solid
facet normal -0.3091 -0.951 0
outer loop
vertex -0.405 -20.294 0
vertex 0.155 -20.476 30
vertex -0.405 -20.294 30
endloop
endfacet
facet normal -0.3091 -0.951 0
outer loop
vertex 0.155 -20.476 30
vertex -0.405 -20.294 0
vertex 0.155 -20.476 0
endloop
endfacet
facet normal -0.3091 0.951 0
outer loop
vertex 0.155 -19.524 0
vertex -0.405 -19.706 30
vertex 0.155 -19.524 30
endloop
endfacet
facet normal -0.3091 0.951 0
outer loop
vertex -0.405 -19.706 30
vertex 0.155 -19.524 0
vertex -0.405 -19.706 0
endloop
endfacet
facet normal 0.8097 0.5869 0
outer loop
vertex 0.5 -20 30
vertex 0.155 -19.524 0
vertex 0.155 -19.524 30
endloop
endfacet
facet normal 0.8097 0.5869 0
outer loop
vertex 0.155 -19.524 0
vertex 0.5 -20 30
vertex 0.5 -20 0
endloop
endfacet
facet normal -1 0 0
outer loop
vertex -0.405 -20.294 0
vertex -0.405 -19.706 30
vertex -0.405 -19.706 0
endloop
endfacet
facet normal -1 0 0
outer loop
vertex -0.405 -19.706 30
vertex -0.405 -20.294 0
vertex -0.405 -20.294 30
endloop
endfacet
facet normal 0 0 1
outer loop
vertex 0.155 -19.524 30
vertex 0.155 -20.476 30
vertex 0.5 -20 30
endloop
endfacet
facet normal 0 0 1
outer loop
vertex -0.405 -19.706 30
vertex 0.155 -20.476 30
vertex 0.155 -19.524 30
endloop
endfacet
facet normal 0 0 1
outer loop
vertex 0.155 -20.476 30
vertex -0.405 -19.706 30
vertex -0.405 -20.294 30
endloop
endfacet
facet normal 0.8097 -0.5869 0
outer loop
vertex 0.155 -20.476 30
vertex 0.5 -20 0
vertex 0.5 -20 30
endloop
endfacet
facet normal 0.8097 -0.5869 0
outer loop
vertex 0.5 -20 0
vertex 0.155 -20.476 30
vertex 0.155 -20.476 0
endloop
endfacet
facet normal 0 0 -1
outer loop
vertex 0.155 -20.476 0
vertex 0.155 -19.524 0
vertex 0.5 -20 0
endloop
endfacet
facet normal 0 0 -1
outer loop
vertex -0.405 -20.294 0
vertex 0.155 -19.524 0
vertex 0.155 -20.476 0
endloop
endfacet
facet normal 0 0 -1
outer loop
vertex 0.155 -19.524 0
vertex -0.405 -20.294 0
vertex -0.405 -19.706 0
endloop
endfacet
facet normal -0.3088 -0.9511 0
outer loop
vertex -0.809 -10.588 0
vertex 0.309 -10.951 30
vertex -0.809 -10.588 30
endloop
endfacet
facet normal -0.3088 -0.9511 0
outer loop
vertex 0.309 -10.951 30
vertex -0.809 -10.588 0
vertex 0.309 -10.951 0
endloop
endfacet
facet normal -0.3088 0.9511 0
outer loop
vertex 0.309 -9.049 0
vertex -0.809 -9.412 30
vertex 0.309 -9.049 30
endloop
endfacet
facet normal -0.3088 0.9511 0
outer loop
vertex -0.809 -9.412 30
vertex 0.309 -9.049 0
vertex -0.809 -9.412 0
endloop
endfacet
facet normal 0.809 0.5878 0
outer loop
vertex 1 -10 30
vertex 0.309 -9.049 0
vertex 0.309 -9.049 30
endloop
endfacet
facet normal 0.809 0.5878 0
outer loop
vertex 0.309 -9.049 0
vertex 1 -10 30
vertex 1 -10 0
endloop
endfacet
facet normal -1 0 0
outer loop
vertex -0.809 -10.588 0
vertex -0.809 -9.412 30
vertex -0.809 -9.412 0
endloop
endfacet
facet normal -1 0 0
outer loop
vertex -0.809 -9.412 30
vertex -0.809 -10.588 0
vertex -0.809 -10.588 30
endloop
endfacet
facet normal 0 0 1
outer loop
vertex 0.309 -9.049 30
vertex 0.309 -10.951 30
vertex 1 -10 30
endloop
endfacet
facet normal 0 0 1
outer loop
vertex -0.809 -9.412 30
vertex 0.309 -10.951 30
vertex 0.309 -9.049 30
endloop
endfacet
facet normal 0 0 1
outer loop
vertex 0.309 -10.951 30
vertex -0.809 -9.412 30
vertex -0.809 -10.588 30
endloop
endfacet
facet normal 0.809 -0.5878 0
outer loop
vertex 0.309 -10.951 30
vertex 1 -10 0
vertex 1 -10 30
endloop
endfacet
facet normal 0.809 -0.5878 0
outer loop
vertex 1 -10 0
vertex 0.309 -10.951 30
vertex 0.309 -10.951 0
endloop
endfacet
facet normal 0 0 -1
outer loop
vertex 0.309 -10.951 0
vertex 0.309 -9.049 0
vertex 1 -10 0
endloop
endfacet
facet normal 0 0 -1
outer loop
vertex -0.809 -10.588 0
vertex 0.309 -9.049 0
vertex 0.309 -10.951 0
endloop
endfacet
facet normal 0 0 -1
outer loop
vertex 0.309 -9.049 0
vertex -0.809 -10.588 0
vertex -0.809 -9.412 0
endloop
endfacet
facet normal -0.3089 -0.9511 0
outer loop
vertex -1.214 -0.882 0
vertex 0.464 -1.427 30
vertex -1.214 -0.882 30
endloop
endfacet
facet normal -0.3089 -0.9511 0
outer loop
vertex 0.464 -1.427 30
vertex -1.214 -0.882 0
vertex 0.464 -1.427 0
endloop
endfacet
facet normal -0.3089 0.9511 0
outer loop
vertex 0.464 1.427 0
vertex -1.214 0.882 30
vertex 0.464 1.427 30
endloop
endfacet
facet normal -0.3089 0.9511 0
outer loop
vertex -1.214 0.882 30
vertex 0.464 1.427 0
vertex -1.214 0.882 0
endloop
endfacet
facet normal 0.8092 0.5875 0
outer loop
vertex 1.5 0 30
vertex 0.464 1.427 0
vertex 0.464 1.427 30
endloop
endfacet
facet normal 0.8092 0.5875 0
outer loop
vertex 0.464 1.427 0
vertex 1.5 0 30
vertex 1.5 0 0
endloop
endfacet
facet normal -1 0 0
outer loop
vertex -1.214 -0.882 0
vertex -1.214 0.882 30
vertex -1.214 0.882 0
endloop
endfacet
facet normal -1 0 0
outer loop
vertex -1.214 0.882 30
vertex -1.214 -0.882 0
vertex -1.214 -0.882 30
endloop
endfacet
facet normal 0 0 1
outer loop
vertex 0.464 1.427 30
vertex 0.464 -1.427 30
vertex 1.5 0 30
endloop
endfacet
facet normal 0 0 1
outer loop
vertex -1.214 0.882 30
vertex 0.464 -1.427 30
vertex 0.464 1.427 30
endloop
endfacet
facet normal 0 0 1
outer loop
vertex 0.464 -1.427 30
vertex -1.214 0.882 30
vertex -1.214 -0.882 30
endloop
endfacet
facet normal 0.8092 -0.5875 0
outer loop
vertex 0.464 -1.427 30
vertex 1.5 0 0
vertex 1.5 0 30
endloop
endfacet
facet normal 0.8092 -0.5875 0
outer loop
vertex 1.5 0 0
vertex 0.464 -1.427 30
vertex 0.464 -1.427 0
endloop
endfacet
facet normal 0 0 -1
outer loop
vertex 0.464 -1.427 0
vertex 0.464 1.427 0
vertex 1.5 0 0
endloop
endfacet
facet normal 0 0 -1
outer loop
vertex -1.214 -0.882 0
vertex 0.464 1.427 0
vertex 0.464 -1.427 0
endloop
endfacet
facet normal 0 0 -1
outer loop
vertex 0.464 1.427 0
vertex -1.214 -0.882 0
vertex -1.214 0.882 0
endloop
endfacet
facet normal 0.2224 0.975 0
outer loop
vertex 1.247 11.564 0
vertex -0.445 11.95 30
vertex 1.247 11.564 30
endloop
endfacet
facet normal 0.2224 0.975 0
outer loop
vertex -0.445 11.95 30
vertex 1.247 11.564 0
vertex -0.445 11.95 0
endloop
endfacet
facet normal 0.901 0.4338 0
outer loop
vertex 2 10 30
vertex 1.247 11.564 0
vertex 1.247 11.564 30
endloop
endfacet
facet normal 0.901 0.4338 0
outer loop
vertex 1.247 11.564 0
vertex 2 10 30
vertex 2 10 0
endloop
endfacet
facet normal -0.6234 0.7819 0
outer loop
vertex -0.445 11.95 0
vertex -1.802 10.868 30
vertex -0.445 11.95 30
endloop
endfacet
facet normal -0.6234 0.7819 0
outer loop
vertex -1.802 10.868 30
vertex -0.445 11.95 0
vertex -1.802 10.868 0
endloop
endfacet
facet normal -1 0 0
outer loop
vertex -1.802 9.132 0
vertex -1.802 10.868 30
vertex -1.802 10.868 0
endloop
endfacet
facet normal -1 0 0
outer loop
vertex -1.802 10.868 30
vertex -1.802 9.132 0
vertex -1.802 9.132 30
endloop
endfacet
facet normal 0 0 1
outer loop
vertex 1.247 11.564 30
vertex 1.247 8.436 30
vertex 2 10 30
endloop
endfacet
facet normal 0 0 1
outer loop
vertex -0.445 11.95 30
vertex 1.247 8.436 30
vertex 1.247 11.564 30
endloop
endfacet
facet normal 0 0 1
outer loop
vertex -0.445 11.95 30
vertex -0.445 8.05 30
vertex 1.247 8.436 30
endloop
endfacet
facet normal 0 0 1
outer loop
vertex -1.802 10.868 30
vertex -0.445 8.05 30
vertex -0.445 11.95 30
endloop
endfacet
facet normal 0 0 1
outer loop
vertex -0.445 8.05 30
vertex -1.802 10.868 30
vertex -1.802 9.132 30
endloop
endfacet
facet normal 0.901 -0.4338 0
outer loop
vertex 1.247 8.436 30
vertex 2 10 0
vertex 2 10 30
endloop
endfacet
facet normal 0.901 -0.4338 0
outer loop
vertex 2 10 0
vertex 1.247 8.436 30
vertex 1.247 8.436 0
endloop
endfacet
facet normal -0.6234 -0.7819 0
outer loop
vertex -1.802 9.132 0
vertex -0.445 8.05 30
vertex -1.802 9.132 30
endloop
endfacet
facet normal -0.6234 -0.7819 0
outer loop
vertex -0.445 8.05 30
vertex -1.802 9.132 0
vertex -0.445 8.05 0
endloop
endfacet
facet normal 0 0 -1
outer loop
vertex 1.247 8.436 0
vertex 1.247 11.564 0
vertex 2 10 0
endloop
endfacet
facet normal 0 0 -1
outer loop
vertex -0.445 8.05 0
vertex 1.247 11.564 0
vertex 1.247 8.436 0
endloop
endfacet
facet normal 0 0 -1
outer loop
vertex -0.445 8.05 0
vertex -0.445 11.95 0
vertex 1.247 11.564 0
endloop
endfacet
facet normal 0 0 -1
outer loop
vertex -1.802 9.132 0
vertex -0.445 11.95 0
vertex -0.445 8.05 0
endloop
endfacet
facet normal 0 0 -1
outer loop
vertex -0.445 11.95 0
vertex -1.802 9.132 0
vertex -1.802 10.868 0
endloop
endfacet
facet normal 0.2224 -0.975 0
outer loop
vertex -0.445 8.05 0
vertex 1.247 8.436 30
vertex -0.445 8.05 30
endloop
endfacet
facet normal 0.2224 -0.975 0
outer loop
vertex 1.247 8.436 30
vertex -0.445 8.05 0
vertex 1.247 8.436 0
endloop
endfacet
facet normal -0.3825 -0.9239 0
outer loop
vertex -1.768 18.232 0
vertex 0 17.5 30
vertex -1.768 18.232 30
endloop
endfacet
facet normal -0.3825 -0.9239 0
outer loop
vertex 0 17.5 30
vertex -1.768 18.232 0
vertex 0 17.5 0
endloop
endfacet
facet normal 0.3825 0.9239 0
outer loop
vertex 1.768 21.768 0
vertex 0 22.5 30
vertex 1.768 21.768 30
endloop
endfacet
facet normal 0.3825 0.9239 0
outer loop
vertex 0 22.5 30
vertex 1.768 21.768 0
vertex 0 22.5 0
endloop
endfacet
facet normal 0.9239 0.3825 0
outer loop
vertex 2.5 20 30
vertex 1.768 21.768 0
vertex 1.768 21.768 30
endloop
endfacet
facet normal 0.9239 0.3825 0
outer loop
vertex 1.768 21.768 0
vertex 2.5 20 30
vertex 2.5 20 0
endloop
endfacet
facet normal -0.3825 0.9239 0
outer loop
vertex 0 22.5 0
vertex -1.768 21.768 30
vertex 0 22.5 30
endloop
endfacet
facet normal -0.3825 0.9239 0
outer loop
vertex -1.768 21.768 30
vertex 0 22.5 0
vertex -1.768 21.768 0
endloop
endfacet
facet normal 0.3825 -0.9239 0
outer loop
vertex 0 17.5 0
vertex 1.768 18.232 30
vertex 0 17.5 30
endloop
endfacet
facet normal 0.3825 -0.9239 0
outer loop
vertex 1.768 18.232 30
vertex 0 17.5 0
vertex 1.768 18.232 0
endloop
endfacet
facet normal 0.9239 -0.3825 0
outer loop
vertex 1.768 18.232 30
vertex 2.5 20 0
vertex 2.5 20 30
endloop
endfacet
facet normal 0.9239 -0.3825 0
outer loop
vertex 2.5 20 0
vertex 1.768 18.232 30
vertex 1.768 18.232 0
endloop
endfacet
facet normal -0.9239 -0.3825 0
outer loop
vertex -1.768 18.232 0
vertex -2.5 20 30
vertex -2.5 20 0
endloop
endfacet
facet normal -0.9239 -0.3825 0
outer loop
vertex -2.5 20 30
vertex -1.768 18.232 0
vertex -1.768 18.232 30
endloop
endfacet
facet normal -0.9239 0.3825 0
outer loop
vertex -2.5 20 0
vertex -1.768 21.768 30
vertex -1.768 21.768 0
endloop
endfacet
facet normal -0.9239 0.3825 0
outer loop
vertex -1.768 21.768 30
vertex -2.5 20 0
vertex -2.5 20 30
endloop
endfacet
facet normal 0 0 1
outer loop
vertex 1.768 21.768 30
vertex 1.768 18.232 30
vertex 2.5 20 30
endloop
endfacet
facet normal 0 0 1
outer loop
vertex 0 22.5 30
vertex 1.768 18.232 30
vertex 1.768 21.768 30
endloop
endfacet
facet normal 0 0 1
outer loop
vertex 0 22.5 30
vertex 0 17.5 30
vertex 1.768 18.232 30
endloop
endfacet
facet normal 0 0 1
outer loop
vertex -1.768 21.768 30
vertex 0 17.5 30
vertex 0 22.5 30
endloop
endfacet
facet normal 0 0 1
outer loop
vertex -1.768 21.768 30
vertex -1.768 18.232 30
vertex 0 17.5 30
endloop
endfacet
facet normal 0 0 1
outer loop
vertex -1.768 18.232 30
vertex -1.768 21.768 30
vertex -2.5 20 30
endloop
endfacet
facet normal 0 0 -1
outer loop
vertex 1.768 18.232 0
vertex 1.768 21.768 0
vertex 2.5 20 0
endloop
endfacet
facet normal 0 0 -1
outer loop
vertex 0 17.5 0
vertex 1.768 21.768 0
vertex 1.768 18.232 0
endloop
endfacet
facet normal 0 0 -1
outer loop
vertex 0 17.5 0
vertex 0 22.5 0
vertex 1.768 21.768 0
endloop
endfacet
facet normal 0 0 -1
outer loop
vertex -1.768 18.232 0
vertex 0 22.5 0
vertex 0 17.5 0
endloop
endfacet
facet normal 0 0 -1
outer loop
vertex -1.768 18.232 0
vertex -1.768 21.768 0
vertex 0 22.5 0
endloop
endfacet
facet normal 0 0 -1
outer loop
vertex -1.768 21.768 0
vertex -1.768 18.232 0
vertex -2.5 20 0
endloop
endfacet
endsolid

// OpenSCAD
union() {
translate(v = [0, -20, 0]) cylinder(30, r=.5);
translate(v = [0, -10, 0]) cylinder(30, r=1);
translate(v = [0, 0, 0]) cylinder(30, r=1.5);
translate(v = [0, 10, 0]) cylinder(30, r=2);
translate(v = [0, 20, 0]) cylinder(30, r=2.5);
}
